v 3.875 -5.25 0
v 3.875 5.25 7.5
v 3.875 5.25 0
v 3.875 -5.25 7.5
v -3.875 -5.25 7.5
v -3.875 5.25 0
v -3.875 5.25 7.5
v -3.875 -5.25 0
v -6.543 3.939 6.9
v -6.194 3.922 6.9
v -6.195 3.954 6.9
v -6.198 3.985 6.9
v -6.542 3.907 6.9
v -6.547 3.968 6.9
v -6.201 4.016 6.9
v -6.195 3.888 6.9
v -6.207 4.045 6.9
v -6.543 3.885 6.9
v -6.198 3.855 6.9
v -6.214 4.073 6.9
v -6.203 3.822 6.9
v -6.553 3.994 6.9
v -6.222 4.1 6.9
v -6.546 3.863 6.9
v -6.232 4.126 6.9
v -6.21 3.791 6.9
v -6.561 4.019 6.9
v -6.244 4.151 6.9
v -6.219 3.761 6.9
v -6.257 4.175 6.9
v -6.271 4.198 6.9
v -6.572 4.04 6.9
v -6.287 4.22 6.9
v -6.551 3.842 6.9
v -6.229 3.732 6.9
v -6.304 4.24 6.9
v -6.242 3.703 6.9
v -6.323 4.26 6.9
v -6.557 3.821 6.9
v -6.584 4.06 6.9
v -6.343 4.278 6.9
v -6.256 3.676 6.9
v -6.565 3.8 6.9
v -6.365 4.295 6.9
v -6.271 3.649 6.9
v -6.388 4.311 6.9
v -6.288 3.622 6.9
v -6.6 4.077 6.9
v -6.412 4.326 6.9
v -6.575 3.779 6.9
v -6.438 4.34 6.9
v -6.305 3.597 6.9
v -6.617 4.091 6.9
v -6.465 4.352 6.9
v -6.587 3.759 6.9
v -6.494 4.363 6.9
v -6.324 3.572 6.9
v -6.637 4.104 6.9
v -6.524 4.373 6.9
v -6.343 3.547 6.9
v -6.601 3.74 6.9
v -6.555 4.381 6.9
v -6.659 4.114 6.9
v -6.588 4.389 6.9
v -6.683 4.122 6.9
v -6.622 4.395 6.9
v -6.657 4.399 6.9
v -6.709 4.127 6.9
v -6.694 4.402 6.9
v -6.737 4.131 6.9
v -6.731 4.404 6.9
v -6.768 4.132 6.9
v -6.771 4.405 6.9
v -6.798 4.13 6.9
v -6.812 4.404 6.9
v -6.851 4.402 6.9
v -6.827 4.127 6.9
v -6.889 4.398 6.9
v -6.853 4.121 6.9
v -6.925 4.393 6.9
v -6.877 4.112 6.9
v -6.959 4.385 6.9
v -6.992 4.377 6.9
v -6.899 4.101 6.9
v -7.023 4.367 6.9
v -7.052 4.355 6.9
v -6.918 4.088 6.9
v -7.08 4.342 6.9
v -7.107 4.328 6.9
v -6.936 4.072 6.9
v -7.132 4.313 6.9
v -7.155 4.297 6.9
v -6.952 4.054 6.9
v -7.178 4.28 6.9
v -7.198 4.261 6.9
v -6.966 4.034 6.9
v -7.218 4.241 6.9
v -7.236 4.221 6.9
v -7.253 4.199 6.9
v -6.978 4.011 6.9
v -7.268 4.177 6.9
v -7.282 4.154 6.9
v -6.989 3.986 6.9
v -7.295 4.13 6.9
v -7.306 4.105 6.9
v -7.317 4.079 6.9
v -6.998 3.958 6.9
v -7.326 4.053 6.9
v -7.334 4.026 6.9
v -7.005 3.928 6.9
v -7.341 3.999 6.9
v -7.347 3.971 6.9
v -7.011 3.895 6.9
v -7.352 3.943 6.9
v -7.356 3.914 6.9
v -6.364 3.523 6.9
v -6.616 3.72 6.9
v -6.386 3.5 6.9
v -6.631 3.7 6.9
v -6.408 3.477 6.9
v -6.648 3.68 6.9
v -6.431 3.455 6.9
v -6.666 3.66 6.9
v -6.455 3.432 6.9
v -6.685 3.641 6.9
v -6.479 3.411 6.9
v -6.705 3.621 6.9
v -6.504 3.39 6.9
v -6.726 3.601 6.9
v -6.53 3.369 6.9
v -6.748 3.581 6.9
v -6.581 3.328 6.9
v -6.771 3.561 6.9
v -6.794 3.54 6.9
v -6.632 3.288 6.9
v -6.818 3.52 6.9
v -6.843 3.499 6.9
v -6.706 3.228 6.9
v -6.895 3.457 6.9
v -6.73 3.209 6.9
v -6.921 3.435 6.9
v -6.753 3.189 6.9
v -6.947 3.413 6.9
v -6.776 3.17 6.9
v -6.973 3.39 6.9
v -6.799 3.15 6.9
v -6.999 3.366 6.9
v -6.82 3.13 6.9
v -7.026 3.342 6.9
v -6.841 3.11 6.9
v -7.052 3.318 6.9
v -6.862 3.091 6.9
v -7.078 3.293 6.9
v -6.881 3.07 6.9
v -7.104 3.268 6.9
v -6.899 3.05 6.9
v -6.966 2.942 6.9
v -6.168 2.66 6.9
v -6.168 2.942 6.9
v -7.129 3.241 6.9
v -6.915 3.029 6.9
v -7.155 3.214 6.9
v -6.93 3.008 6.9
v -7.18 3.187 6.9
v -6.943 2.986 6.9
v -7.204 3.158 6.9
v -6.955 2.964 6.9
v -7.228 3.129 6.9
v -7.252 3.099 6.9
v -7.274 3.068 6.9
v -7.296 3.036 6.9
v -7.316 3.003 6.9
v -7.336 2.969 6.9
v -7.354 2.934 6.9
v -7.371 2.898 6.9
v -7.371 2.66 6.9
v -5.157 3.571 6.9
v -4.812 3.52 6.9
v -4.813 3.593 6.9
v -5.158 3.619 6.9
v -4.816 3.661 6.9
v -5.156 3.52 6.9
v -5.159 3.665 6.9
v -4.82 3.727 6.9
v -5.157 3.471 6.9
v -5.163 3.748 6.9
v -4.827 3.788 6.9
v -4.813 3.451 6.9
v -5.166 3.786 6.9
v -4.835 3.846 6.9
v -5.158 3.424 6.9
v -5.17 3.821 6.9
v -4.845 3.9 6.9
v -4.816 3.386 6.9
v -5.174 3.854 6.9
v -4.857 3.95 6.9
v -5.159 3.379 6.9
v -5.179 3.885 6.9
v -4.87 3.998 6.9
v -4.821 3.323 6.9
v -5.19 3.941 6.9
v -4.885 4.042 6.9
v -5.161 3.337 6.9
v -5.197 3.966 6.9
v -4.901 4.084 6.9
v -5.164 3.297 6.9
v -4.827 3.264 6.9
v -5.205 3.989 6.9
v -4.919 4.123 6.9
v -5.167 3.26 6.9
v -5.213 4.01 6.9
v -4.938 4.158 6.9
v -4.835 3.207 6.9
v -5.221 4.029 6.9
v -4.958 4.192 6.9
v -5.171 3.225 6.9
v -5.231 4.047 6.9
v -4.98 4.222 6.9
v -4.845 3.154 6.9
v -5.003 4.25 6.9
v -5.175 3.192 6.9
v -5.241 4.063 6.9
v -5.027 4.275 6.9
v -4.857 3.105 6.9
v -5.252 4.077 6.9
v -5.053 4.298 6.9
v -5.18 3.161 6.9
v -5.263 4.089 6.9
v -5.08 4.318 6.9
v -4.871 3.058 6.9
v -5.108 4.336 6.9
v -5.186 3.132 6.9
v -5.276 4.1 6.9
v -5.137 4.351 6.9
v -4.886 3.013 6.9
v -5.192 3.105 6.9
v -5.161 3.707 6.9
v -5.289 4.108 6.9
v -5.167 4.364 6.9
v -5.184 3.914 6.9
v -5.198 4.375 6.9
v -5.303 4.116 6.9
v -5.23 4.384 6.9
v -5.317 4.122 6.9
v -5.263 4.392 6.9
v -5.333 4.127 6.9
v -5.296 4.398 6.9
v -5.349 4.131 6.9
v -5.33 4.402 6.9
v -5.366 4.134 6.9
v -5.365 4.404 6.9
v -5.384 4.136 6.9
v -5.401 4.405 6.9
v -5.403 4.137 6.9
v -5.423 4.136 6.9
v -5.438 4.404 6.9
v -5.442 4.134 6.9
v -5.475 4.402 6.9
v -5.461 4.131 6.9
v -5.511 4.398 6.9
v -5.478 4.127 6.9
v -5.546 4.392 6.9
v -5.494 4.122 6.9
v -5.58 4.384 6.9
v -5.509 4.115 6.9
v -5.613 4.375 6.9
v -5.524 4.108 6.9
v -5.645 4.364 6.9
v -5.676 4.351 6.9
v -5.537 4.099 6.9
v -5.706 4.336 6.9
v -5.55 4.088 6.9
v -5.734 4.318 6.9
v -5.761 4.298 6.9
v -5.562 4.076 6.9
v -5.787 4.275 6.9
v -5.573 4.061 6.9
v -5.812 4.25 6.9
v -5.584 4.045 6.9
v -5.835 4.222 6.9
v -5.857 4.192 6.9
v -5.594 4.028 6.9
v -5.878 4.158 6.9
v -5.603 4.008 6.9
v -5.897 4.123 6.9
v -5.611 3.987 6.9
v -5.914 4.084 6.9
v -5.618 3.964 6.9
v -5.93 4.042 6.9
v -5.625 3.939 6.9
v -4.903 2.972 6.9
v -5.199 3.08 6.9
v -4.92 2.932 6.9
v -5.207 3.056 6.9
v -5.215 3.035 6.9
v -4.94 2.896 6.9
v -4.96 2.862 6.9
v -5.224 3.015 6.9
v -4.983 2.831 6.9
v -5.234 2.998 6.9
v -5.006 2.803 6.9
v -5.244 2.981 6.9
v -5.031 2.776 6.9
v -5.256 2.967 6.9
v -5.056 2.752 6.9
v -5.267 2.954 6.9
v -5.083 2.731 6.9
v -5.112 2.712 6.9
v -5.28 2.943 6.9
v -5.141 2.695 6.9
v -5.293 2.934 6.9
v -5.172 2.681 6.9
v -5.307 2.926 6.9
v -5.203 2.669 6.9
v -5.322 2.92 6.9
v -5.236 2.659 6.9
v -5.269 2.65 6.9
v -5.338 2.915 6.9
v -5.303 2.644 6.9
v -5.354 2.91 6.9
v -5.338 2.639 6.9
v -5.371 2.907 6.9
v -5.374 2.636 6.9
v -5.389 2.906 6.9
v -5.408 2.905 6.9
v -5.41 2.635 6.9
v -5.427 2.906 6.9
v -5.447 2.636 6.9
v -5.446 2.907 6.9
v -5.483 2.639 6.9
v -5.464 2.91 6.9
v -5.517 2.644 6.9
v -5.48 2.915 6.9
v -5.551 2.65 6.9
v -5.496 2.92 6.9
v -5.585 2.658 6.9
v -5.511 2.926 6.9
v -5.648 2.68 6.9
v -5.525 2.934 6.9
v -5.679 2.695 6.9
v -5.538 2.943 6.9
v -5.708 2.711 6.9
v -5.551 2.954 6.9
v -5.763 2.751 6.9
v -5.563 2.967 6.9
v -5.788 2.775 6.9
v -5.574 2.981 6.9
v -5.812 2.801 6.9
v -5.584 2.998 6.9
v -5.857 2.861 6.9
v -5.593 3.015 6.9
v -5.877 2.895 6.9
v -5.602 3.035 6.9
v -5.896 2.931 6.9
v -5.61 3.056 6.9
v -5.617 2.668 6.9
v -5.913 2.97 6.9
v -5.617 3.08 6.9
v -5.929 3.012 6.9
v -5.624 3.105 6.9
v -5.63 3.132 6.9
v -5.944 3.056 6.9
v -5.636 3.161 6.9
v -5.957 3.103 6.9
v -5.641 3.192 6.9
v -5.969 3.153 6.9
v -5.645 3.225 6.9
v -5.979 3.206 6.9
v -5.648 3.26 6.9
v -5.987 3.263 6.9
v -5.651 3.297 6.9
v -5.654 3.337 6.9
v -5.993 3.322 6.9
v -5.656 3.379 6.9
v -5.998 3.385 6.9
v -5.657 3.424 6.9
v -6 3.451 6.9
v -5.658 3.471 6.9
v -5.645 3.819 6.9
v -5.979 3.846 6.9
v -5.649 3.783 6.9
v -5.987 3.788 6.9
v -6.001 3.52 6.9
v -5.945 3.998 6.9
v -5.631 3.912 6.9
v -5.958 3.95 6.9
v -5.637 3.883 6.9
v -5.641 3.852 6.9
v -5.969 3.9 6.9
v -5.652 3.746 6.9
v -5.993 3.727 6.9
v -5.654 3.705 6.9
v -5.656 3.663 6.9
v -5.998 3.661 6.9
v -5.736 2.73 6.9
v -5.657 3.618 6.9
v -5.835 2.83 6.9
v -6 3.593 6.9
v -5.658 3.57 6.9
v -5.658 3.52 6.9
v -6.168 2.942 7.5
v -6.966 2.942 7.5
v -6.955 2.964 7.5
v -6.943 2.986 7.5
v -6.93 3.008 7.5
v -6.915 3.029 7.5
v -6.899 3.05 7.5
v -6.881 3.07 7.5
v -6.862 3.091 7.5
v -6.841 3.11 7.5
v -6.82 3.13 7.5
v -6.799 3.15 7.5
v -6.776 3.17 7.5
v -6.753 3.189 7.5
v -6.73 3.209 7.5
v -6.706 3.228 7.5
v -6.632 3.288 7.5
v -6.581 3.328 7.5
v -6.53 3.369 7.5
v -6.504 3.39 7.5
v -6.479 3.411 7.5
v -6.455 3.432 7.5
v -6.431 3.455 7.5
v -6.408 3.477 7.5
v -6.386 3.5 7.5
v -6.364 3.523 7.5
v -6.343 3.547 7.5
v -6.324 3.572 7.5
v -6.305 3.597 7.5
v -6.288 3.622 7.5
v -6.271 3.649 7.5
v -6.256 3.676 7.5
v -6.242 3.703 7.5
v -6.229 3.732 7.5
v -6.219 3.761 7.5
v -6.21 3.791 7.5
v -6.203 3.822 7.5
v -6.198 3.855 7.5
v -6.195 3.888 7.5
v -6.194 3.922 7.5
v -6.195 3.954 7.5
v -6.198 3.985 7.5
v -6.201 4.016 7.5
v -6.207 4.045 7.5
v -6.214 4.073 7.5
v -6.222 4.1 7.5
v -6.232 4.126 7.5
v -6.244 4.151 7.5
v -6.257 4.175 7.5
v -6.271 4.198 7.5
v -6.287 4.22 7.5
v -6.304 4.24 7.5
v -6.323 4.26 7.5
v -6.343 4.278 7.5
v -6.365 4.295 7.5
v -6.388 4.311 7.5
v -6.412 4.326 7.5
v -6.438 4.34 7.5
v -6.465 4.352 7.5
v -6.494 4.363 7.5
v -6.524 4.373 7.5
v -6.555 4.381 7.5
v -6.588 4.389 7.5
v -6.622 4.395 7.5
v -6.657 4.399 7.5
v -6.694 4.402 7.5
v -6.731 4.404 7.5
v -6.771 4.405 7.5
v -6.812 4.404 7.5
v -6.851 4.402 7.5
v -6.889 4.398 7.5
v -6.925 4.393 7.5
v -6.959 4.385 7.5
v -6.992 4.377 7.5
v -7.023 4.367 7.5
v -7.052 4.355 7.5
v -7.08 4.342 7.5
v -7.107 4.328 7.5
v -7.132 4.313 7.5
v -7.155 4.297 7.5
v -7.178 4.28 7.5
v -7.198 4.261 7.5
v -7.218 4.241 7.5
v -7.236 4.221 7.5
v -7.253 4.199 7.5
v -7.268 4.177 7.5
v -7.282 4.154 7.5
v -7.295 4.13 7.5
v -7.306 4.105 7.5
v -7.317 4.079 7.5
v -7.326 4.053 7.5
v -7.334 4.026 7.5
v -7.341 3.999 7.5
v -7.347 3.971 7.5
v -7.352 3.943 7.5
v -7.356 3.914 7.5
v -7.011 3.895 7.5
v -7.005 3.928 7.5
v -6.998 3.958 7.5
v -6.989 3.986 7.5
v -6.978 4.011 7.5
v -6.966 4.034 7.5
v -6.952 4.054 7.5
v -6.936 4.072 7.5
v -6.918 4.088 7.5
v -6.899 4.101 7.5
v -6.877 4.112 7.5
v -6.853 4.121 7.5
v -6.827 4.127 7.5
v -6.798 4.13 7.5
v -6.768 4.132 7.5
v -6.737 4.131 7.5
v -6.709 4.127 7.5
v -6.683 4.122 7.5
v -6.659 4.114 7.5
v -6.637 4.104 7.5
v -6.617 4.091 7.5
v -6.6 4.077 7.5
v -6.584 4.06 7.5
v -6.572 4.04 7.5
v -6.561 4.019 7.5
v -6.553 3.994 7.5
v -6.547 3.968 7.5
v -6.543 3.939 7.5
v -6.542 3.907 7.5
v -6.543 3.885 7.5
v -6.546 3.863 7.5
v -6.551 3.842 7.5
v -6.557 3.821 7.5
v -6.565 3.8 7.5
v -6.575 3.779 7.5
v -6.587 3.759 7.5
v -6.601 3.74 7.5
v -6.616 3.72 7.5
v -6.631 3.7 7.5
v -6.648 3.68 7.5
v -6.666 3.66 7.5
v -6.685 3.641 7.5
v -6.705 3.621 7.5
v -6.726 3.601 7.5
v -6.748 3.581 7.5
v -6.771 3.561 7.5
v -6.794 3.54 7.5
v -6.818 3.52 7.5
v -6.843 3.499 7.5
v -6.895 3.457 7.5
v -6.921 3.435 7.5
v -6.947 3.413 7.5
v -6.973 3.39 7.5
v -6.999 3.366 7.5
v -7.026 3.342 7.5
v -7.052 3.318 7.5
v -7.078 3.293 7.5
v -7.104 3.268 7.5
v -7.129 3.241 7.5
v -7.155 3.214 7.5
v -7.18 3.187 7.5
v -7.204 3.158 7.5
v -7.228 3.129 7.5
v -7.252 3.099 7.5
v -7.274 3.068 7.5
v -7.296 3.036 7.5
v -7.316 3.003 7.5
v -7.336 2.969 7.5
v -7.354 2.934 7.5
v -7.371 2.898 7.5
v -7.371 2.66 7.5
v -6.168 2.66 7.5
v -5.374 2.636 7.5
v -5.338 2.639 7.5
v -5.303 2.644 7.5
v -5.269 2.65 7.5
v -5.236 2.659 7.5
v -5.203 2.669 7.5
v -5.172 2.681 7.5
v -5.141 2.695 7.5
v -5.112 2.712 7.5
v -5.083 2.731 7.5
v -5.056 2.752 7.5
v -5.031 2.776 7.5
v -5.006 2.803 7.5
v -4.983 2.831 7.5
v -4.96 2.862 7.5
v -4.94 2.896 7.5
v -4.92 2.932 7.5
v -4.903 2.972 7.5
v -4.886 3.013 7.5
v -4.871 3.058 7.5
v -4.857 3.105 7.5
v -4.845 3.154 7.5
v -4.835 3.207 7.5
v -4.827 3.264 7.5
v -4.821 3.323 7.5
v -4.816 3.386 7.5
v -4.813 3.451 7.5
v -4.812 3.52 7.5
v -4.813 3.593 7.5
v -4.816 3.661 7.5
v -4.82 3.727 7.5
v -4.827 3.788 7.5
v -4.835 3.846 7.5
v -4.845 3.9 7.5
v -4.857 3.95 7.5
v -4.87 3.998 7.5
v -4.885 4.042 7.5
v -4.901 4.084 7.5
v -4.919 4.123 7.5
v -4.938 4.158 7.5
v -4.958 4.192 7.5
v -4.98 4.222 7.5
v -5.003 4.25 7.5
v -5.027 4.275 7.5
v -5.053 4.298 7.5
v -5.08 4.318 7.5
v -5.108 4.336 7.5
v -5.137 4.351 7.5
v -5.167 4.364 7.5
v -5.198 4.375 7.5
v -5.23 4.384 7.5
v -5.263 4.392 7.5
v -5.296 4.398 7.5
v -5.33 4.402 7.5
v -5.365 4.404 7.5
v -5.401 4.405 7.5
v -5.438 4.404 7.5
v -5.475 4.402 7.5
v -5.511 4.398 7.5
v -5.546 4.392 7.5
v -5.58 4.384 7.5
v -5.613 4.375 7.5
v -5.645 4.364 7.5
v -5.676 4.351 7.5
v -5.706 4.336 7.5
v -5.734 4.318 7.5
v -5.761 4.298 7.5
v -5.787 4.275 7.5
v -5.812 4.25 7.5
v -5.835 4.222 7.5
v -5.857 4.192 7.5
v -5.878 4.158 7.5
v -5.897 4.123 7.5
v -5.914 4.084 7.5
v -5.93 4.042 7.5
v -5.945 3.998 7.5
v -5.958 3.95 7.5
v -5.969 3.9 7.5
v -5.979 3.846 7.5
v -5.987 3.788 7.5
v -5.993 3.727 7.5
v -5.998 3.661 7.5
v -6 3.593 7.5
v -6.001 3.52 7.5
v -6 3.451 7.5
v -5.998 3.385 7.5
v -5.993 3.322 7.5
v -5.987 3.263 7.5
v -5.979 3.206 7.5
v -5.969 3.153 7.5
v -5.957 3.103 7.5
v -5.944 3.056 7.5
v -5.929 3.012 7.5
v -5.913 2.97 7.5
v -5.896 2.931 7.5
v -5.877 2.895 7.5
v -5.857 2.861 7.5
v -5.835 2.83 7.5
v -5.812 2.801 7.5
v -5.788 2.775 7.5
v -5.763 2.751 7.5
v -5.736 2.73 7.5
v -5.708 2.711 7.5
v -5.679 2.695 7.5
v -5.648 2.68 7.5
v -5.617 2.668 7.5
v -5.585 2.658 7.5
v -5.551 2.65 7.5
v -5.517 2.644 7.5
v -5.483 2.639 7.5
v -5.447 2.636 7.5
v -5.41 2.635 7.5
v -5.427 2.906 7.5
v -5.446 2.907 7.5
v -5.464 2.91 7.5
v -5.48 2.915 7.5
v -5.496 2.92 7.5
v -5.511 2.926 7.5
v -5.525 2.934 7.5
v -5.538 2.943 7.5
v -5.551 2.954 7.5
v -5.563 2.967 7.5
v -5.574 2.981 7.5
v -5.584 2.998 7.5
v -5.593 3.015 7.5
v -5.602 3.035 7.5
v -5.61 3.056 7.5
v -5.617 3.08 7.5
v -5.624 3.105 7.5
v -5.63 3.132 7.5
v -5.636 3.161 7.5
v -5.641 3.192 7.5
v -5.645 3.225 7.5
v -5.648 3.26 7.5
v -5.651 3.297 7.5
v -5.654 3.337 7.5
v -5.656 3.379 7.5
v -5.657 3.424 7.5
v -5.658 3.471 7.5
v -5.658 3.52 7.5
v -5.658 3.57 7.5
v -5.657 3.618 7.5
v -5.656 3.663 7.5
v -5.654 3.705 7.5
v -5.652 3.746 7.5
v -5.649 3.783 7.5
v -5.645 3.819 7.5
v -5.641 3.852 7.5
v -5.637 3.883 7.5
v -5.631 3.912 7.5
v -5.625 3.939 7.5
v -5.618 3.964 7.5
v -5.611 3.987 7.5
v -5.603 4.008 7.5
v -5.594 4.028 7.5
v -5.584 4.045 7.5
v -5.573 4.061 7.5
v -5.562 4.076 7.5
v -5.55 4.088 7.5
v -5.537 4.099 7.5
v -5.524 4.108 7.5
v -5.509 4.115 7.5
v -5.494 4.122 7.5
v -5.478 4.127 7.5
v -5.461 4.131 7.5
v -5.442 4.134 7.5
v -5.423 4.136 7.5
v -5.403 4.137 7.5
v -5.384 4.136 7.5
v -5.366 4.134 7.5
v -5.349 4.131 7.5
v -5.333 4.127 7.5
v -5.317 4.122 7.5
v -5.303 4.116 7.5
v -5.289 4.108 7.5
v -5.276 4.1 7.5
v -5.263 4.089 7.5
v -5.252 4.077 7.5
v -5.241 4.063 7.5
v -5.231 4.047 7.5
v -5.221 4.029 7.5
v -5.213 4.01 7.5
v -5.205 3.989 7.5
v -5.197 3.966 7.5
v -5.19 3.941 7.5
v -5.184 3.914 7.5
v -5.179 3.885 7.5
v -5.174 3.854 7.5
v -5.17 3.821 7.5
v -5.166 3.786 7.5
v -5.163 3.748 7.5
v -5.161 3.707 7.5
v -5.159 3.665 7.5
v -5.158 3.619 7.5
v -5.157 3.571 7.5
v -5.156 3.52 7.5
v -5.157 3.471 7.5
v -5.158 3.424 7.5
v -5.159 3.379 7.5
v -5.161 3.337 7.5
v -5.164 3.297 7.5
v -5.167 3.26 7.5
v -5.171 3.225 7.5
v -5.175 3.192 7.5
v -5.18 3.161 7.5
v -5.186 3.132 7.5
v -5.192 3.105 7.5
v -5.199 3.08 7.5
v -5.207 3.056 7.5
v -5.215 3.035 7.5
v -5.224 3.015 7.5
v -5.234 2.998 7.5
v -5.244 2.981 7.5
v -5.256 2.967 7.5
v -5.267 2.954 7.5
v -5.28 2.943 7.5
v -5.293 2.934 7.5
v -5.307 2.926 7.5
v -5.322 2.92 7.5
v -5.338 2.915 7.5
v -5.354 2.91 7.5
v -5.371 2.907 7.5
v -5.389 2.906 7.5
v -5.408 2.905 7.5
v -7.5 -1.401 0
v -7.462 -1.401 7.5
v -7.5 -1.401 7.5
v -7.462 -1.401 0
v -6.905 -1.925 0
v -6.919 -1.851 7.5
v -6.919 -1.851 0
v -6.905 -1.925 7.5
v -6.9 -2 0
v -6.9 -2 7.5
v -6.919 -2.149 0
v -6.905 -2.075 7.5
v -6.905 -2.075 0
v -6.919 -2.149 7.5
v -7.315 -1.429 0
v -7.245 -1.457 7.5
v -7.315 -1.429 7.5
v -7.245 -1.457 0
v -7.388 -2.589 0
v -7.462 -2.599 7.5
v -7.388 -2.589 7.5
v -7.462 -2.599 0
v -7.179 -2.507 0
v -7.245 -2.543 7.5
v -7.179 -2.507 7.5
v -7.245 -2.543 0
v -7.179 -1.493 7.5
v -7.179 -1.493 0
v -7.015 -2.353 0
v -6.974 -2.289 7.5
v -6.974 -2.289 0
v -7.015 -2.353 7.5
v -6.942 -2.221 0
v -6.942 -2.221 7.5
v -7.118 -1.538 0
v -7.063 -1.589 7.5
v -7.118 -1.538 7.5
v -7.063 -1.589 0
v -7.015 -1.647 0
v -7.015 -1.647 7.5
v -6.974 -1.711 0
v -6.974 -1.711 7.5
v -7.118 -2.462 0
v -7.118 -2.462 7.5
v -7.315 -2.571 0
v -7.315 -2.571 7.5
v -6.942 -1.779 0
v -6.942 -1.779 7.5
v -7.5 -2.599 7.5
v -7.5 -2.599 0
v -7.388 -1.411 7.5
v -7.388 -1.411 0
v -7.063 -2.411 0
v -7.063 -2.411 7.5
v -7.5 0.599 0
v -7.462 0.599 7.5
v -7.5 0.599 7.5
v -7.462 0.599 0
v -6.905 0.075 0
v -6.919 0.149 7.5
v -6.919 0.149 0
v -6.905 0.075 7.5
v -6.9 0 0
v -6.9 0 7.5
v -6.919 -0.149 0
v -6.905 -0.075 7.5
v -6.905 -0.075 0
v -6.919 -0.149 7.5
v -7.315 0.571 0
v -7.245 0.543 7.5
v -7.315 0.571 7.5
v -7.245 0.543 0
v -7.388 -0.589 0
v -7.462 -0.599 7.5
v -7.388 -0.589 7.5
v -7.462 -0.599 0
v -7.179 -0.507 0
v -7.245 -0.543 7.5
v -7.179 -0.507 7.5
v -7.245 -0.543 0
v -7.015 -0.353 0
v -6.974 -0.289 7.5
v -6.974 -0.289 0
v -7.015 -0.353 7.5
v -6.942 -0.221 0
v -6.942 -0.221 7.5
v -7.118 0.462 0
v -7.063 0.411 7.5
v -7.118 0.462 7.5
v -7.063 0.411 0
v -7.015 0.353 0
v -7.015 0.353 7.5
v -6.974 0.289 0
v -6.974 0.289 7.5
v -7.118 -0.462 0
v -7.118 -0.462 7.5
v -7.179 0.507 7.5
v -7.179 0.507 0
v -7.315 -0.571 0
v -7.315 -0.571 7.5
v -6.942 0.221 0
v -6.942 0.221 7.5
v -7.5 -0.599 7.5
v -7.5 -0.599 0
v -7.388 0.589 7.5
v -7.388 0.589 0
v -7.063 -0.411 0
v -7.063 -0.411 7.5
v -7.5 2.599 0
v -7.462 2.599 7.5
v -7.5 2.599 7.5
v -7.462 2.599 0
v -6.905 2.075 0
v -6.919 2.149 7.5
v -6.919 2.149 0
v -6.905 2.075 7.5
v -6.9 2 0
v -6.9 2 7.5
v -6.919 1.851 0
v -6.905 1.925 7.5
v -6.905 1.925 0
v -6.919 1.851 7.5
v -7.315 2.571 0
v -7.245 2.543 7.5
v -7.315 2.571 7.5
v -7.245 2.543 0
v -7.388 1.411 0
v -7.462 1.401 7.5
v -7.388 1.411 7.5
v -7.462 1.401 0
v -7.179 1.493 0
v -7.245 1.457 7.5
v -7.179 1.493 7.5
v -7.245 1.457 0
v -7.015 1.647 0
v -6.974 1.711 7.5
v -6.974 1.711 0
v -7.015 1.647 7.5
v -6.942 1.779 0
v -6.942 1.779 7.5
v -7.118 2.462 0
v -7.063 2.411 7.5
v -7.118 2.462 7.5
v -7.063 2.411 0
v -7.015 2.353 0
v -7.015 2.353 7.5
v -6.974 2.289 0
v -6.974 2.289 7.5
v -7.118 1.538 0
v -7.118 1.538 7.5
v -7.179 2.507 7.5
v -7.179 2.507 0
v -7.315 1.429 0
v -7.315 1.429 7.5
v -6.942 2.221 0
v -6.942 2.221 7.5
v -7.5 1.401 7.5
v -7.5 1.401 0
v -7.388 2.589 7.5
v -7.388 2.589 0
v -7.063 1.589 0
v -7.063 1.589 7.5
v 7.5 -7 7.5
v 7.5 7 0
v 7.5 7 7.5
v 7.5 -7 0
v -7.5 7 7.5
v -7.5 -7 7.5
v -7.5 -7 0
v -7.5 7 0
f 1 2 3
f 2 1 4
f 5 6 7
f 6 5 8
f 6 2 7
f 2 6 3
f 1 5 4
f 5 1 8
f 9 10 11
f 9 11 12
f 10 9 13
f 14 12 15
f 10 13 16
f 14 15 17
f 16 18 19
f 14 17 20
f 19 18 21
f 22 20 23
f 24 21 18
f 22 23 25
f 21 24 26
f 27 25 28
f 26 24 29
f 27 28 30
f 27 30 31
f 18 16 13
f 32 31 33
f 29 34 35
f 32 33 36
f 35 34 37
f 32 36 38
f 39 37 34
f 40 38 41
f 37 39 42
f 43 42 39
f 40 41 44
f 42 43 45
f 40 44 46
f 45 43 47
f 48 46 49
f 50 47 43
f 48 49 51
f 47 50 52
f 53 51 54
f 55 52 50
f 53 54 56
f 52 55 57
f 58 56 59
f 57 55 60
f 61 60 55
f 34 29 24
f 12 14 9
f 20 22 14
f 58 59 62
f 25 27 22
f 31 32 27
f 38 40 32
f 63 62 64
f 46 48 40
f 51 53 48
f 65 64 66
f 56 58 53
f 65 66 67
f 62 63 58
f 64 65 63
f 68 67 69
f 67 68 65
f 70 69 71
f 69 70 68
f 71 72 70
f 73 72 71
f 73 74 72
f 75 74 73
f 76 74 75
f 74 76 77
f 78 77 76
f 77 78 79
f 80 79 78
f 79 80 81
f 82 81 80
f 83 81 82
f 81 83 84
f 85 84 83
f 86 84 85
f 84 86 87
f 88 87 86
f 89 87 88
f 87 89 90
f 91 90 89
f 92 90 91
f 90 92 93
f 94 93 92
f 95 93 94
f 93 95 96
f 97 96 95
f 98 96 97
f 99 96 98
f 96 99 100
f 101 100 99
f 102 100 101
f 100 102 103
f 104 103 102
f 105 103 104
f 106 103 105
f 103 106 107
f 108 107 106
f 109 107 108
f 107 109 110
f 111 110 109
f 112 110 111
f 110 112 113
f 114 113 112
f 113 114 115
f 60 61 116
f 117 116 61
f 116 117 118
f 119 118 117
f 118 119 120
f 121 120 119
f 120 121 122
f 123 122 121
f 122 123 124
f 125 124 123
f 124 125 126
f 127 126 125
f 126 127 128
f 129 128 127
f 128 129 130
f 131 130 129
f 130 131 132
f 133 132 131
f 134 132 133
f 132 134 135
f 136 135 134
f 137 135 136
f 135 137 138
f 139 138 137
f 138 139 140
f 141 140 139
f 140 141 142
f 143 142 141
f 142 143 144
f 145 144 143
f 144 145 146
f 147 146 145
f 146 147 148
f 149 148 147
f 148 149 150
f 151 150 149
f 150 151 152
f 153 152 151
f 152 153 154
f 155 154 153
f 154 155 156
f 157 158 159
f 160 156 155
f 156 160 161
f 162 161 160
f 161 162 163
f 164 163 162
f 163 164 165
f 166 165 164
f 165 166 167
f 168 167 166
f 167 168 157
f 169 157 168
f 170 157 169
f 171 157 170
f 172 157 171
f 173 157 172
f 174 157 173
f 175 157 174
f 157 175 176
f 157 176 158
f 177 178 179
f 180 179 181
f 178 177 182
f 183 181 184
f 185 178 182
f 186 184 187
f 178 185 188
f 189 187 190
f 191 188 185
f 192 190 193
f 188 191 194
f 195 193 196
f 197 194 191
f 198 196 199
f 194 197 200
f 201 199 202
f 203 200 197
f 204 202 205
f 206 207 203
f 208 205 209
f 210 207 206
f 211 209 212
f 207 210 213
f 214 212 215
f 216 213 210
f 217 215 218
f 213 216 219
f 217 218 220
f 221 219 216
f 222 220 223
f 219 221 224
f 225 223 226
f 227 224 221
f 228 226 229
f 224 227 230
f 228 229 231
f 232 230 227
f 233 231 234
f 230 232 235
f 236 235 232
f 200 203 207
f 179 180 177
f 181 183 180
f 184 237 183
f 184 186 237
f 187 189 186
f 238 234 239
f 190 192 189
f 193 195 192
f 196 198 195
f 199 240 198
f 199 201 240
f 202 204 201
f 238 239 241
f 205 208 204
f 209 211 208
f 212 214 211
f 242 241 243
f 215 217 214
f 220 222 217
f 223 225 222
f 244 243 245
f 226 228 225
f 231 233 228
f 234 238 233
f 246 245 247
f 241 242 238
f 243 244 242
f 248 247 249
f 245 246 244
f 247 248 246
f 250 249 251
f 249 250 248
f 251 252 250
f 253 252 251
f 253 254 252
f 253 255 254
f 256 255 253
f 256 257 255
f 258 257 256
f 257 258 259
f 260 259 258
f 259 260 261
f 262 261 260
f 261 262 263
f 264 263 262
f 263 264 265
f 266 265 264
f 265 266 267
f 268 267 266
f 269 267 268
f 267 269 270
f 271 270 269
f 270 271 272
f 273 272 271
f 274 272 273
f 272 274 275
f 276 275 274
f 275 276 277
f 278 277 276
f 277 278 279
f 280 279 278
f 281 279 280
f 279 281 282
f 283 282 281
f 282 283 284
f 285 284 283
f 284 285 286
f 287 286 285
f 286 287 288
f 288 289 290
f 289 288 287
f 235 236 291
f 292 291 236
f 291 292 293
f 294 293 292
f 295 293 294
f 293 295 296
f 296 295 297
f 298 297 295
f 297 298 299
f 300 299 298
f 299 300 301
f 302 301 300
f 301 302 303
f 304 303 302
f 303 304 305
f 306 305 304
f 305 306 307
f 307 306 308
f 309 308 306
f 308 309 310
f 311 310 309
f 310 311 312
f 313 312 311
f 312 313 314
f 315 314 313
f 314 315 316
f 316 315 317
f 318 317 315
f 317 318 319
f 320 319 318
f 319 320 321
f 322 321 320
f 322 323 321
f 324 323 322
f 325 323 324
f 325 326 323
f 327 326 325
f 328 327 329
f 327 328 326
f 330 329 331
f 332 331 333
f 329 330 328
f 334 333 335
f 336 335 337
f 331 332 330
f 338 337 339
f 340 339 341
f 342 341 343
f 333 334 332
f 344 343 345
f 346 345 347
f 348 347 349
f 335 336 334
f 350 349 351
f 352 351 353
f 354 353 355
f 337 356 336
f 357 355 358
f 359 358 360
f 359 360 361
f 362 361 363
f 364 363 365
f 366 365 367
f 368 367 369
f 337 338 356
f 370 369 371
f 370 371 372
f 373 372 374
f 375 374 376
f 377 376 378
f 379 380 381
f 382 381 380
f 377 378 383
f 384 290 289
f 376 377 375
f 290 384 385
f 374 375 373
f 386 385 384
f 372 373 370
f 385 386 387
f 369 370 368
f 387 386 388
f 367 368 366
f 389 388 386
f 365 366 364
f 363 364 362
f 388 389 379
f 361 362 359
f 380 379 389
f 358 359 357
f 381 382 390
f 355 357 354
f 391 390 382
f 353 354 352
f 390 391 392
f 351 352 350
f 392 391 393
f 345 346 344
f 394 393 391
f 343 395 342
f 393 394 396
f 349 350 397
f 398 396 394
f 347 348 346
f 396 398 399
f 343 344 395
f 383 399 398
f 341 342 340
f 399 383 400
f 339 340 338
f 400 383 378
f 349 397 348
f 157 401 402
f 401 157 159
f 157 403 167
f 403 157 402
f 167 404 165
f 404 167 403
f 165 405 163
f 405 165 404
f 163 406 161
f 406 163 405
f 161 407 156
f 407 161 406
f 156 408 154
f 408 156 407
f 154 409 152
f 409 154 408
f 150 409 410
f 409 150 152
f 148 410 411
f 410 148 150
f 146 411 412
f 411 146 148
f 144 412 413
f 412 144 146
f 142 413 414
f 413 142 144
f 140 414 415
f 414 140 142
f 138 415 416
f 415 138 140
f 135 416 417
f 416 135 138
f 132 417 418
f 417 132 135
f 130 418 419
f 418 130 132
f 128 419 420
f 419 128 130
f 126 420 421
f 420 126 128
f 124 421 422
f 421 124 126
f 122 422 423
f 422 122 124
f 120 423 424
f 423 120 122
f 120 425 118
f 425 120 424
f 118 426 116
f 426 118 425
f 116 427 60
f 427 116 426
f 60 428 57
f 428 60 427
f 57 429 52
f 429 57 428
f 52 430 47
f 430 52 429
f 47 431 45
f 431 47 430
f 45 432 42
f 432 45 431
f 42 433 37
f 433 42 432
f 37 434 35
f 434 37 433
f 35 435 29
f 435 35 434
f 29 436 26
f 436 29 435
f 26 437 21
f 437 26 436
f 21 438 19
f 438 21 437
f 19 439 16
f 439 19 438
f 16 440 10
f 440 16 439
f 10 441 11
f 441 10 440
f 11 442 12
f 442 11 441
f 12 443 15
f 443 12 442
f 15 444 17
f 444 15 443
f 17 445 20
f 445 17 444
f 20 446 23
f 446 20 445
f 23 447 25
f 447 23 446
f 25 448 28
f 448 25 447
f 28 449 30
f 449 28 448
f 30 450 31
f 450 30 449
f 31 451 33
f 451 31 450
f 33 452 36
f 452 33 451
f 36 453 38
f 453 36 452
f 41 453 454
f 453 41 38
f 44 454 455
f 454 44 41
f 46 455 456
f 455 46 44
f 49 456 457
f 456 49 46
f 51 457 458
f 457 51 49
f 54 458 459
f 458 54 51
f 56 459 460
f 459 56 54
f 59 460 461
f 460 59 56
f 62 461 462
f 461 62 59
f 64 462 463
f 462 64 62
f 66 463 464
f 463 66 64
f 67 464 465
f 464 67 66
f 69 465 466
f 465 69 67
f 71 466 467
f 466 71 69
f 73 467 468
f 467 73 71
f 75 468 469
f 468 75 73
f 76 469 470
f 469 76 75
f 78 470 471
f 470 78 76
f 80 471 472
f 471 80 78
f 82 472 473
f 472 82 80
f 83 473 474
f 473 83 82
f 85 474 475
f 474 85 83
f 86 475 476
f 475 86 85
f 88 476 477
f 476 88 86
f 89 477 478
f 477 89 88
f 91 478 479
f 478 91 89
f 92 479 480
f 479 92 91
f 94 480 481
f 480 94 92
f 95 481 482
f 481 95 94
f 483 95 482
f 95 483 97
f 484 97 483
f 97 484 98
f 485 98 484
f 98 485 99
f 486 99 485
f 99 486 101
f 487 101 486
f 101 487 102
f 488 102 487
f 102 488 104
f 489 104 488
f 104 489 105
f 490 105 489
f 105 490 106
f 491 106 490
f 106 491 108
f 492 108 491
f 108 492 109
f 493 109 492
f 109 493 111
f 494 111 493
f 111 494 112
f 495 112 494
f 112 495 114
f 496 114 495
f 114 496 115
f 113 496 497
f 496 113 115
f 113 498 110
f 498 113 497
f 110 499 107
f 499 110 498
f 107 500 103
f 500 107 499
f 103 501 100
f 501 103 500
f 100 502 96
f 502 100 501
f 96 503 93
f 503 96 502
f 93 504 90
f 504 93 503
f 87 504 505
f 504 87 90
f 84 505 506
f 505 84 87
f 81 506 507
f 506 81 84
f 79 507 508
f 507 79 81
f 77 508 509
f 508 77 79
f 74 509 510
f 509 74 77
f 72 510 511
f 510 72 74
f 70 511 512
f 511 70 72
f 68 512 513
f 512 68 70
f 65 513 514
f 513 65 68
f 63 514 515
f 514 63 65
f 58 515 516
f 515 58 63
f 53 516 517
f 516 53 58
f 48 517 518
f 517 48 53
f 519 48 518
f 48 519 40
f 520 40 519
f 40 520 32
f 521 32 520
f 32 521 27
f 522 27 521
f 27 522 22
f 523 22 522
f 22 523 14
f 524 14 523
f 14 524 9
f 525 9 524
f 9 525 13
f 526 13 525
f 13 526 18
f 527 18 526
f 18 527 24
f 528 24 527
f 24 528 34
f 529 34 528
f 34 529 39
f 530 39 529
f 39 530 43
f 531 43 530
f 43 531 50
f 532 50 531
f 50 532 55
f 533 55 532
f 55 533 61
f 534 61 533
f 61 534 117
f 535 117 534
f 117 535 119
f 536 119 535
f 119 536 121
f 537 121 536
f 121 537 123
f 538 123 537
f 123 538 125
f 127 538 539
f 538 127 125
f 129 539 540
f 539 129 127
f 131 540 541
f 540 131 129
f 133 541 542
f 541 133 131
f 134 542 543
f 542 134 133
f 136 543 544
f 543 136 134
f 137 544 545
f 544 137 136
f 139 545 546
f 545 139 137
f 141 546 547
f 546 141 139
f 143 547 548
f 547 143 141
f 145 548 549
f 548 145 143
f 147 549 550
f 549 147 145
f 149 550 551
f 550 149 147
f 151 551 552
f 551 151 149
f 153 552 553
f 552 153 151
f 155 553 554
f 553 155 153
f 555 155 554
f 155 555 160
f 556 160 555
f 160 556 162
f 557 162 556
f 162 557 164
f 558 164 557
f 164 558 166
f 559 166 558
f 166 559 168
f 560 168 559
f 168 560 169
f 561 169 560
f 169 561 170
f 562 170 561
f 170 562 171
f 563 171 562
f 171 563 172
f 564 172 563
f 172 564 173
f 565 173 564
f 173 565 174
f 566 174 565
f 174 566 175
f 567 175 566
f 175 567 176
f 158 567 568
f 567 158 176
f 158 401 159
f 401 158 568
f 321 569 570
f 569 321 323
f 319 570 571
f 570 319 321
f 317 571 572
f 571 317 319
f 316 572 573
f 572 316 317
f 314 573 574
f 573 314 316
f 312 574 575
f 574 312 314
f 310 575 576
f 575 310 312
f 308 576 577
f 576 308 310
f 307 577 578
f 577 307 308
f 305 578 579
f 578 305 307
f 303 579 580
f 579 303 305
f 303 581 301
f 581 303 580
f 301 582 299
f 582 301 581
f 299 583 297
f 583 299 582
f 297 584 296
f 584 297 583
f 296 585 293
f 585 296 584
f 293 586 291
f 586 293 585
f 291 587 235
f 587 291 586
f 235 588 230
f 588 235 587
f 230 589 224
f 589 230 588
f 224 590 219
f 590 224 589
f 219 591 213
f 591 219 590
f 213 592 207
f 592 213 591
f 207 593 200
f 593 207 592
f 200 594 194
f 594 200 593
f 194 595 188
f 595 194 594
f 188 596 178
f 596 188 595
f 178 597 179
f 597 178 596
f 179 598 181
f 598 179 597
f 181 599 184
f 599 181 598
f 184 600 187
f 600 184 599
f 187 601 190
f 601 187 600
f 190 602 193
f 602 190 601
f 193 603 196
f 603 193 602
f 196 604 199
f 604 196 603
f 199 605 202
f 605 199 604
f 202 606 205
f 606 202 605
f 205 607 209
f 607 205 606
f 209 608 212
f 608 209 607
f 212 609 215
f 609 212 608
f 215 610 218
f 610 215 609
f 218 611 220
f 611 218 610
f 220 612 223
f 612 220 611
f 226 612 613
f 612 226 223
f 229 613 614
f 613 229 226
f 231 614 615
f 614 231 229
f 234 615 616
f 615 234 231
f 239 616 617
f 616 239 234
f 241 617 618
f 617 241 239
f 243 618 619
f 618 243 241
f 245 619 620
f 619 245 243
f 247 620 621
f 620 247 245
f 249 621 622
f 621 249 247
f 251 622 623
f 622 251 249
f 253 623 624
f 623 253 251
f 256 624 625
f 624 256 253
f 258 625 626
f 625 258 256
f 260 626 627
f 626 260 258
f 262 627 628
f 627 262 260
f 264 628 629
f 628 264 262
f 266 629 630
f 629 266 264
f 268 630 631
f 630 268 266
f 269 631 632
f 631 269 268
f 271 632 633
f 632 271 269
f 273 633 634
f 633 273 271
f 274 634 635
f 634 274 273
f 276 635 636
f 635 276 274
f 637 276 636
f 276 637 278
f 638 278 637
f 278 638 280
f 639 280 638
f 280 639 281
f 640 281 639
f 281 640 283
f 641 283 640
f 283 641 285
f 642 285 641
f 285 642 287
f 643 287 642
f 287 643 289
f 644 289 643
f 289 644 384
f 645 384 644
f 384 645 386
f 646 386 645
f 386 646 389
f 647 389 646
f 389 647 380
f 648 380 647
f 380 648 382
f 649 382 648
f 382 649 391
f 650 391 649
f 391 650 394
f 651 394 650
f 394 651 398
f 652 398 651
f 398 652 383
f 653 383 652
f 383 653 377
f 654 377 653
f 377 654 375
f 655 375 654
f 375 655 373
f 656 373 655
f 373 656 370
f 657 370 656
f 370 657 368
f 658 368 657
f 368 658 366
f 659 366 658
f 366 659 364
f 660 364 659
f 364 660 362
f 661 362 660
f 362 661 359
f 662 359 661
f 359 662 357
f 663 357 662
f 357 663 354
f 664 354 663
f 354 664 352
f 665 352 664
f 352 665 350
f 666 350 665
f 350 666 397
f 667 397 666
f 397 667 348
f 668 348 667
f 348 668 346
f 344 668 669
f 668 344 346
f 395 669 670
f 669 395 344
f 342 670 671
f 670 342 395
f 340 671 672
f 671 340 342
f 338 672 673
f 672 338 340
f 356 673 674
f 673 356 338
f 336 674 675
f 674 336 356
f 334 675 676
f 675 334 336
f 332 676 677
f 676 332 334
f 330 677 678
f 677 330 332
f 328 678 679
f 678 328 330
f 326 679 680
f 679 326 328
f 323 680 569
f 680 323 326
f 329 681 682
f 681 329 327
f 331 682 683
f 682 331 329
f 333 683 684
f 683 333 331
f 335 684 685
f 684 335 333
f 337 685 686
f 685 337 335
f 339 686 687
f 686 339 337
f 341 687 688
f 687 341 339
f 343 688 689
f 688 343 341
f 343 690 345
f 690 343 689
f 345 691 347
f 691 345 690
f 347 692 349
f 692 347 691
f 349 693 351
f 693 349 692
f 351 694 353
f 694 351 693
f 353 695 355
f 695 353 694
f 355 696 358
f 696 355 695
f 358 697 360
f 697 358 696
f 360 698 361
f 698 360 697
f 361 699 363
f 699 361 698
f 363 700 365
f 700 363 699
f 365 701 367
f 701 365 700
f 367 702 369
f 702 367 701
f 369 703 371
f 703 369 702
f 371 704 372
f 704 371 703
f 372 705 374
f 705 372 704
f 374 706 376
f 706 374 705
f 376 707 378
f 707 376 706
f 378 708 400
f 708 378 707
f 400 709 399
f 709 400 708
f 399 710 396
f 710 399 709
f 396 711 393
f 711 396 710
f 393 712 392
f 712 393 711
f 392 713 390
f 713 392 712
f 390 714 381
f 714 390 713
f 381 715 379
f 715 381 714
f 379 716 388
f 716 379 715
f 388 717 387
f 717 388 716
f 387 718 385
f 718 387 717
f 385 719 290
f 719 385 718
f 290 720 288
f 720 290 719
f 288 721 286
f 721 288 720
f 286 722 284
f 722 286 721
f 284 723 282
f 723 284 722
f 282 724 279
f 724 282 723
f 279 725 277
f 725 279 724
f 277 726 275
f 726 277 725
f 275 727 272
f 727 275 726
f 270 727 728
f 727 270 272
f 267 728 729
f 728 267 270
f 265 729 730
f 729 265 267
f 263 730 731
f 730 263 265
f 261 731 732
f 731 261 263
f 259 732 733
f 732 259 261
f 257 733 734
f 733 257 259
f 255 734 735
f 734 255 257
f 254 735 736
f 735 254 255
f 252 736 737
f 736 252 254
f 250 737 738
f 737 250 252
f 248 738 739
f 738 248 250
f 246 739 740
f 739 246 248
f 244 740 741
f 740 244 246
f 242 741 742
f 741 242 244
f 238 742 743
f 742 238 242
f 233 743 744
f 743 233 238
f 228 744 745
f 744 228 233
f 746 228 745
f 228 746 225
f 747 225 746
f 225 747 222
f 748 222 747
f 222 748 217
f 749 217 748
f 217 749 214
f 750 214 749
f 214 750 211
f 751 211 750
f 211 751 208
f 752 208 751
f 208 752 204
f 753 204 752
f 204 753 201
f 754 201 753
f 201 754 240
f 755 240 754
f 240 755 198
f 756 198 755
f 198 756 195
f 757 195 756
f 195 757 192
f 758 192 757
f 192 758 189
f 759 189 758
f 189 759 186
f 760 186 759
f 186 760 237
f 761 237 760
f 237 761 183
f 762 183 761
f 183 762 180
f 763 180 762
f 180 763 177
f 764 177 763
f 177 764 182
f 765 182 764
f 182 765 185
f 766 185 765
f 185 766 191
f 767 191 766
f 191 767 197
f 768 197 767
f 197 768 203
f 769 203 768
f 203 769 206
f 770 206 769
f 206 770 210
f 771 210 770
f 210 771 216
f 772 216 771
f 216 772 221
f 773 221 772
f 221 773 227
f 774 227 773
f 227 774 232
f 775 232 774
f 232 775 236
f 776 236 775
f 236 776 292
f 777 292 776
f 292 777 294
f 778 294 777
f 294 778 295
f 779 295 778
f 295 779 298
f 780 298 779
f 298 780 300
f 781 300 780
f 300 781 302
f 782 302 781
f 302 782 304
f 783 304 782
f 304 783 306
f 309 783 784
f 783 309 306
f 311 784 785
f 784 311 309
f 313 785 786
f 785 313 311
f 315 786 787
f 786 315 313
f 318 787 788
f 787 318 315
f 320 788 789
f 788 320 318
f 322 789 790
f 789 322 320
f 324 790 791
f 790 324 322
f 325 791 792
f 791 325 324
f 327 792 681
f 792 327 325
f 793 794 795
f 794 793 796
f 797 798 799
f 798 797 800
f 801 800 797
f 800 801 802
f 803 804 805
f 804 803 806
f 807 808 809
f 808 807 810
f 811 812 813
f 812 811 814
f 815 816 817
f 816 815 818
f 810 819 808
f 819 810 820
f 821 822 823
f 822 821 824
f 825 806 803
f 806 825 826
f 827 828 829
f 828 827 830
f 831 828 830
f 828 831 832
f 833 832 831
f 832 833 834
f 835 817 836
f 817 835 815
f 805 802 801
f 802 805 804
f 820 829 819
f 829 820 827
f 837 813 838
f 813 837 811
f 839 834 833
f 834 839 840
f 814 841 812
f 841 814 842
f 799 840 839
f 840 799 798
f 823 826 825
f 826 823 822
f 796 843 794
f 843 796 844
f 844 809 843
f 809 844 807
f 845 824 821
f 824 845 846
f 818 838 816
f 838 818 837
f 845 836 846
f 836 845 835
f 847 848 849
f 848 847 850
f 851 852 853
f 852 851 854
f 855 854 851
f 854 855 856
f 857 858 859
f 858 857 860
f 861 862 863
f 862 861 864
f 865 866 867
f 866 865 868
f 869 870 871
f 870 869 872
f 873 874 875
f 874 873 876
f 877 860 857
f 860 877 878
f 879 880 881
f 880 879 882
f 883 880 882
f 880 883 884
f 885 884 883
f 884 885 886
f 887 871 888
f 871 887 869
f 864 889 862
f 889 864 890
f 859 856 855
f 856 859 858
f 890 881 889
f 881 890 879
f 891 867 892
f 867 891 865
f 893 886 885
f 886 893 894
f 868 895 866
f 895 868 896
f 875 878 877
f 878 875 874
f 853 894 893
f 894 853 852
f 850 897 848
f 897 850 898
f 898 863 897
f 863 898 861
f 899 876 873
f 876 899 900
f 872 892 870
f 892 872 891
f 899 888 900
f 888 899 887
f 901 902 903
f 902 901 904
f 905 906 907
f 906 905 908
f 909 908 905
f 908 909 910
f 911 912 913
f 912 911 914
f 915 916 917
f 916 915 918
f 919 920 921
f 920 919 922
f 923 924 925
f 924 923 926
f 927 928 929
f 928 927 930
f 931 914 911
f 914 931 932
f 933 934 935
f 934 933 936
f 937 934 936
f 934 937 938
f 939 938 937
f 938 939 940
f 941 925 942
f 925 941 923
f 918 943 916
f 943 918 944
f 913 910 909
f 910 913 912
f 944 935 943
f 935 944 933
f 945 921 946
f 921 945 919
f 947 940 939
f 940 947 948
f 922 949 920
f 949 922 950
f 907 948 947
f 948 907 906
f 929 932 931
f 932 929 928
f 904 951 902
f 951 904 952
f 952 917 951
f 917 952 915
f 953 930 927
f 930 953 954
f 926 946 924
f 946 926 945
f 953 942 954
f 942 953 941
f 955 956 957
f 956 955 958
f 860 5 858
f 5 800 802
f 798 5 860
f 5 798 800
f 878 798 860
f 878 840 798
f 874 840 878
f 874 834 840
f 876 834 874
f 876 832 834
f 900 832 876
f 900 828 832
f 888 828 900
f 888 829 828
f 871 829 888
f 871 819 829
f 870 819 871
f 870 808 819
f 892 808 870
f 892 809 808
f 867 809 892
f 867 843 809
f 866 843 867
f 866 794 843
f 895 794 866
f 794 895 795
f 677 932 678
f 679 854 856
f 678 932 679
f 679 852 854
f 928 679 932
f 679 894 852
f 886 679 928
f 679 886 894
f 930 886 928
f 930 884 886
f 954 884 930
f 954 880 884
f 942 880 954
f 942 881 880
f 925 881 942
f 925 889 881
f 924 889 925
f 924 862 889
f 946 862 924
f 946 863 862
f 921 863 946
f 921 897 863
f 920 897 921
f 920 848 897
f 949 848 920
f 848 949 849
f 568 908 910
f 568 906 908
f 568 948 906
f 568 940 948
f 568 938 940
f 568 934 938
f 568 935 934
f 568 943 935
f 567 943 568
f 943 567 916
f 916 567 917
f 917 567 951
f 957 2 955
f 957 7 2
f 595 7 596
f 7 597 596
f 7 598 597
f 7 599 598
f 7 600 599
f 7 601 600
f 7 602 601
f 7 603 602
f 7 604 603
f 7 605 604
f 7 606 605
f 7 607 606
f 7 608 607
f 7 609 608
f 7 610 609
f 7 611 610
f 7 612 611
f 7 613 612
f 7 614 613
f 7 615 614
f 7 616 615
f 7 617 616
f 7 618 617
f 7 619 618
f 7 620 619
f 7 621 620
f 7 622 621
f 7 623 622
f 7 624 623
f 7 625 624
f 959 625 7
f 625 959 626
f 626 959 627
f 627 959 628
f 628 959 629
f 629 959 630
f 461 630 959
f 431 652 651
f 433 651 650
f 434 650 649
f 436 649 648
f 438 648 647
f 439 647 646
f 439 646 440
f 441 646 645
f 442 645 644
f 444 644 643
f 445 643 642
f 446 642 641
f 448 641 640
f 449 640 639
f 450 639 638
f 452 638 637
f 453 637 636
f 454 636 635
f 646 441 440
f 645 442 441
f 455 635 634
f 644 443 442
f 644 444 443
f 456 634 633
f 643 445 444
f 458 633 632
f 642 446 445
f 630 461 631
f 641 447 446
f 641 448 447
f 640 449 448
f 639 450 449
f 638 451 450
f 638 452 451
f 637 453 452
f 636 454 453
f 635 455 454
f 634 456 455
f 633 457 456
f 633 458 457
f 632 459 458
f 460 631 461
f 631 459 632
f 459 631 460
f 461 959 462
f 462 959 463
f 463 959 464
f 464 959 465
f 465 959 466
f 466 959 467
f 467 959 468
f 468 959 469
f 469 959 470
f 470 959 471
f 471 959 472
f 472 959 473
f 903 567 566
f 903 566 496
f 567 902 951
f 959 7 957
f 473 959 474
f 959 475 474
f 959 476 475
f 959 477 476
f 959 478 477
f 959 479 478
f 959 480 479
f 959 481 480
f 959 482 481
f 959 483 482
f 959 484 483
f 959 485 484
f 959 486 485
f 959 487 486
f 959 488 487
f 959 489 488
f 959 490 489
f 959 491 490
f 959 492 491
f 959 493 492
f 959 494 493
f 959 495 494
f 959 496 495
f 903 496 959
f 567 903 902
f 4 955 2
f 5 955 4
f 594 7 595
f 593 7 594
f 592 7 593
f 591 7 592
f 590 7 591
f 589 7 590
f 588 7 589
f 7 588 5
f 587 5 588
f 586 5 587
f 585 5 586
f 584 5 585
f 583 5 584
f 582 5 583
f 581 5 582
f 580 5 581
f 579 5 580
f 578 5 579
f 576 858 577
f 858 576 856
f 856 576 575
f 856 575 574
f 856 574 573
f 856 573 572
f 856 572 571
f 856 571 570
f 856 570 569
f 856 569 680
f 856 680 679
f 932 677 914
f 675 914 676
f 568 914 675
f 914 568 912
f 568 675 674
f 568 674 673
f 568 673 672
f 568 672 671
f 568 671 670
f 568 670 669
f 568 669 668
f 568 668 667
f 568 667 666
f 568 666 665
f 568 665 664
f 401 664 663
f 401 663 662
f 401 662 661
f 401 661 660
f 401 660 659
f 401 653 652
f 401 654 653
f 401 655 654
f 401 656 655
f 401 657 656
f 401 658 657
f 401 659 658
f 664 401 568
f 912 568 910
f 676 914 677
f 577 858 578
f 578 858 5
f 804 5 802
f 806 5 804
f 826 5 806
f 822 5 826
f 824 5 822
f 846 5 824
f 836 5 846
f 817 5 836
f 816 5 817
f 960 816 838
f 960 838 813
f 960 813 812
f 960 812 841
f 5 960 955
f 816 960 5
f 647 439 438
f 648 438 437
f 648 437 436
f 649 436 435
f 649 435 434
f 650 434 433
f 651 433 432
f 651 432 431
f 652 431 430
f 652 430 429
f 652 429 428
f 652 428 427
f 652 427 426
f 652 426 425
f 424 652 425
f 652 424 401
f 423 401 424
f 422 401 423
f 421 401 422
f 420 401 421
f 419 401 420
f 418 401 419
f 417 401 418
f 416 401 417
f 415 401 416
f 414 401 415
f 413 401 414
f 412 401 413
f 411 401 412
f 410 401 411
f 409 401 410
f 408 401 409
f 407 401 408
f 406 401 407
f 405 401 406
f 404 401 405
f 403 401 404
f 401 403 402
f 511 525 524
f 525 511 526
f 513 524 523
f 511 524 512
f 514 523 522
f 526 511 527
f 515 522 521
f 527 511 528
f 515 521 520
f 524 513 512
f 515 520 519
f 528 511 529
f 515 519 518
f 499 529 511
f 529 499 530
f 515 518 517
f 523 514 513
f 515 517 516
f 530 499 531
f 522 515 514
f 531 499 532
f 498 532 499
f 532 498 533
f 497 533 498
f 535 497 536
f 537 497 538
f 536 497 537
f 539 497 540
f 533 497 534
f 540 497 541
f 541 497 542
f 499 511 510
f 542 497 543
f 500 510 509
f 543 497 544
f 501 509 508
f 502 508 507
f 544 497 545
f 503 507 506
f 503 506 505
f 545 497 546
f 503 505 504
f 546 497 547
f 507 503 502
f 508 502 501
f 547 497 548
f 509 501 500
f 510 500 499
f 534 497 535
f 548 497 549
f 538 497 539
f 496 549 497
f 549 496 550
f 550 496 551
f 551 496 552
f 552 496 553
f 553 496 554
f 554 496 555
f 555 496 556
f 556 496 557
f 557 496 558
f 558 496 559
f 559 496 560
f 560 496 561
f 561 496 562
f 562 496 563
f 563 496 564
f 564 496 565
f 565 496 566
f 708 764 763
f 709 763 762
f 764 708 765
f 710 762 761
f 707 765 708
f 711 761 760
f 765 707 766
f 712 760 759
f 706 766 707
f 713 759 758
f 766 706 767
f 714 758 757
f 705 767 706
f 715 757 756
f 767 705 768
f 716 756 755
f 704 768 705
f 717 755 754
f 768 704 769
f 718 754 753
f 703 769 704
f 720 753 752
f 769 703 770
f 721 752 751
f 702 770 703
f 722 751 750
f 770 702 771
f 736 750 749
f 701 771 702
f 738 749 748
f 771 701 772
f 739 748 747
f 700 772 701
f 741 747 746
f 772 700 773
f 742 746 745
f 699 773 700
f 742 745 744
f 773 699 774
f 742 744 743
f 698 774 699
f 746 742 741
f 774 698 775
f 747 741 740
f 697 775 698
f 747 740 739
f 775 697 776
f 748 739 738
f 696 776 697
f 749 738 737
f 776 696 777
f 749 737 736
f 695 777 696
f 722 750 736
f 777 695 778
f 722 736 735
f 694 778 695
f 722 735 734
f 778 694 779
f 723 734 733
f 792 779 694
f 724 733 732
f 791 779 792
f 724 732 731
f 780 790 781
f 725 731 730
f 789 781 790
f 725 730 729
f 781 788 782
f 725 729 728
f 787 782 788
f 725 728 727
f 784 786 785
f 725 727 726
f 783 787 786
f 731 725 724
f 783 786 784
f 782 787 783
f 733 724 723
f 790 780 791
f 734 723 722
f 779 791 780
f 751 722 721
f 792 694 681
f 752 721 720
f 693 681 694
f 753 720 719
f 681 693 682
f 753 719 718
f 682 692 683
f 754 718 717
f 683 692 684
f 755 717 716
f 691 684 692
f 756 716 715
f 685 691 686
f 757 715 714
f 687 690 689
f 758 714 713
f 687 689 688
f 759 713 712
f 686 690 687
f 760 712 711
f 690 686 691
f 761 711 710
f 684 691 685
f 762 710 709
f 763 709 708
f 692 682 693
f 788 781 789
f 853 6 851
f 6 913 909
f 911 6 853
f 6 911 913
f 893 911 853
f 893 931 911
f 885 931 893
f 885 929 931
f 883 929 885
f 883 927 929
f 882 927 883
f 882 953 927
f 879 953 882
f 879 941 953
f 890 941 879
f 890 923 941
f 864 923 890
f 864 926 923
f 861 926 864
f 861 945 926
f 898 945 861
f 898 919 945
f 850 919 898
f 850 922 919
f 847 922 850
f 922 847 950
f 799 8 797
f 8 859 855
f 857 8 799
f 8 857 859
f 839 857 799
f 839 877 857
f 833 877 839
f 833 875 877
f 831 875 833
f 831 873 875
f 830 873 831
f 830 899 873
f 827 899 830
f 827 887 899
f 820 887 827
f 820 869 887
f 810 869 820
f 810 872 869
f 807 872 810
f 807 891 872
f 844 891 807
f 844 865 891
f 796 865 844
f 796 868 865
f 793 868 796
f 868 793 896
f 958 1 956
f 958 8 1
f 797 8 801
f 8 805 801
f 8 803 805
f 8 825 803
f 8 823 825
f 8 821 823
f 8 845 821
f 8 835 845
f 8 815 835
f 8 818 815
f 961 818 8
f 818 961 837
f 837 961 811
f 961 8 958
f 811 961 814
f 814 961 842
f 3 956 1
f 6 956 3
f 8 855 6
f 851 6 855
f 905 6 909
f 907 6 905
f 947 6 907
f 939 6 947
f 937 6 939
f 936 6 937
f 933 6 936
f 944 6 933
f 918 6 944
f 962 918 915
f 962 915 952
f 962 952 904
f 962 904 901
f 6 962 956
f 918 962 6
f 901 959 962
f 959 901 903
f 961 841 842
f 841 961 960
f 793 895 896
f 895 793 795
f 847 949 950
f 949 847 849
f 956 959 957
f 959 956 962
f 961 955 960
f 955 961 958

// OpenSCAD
$fn = 50;

difference() {
	union() {
		translate(v = [0, -5, 0]) {
			rotate(a = [0, 0, 0]) {
				difference() {
					union() {
						translate(v = [-7.5, -2.0, 0]) {
							cube(size = [15.0, 14.0, 7.5]);
						}
					}
					union() {
						translate(v = [-3.875, -0.25, -0.1]) {
							cube(size = [7.75, 10.5, 7.7]);
						}
						translate(v = [-6.1, 8.5, 6.9]) {
							linear_extrude(height = 0.7) {
								text(font = "Arial:style=Bold", halign = "center", size = 1.8, text = "20", valign = "center");
							}
						}
						translate(v = [-7.5, 3, -0.1]) {
							cylinder(h = 7.7, r = 0.6);
						}
						translate(v = [-7.5, 5, -0.1]) {
							cylinder(h = 7.7, r = 0.6);
						}
						translate(v = [-7.5, 7, -0.1]) {
							cylinder(h = 7.7, r = 0.6);
						}
					}
				}
			}
		}
	}
	union();
}
